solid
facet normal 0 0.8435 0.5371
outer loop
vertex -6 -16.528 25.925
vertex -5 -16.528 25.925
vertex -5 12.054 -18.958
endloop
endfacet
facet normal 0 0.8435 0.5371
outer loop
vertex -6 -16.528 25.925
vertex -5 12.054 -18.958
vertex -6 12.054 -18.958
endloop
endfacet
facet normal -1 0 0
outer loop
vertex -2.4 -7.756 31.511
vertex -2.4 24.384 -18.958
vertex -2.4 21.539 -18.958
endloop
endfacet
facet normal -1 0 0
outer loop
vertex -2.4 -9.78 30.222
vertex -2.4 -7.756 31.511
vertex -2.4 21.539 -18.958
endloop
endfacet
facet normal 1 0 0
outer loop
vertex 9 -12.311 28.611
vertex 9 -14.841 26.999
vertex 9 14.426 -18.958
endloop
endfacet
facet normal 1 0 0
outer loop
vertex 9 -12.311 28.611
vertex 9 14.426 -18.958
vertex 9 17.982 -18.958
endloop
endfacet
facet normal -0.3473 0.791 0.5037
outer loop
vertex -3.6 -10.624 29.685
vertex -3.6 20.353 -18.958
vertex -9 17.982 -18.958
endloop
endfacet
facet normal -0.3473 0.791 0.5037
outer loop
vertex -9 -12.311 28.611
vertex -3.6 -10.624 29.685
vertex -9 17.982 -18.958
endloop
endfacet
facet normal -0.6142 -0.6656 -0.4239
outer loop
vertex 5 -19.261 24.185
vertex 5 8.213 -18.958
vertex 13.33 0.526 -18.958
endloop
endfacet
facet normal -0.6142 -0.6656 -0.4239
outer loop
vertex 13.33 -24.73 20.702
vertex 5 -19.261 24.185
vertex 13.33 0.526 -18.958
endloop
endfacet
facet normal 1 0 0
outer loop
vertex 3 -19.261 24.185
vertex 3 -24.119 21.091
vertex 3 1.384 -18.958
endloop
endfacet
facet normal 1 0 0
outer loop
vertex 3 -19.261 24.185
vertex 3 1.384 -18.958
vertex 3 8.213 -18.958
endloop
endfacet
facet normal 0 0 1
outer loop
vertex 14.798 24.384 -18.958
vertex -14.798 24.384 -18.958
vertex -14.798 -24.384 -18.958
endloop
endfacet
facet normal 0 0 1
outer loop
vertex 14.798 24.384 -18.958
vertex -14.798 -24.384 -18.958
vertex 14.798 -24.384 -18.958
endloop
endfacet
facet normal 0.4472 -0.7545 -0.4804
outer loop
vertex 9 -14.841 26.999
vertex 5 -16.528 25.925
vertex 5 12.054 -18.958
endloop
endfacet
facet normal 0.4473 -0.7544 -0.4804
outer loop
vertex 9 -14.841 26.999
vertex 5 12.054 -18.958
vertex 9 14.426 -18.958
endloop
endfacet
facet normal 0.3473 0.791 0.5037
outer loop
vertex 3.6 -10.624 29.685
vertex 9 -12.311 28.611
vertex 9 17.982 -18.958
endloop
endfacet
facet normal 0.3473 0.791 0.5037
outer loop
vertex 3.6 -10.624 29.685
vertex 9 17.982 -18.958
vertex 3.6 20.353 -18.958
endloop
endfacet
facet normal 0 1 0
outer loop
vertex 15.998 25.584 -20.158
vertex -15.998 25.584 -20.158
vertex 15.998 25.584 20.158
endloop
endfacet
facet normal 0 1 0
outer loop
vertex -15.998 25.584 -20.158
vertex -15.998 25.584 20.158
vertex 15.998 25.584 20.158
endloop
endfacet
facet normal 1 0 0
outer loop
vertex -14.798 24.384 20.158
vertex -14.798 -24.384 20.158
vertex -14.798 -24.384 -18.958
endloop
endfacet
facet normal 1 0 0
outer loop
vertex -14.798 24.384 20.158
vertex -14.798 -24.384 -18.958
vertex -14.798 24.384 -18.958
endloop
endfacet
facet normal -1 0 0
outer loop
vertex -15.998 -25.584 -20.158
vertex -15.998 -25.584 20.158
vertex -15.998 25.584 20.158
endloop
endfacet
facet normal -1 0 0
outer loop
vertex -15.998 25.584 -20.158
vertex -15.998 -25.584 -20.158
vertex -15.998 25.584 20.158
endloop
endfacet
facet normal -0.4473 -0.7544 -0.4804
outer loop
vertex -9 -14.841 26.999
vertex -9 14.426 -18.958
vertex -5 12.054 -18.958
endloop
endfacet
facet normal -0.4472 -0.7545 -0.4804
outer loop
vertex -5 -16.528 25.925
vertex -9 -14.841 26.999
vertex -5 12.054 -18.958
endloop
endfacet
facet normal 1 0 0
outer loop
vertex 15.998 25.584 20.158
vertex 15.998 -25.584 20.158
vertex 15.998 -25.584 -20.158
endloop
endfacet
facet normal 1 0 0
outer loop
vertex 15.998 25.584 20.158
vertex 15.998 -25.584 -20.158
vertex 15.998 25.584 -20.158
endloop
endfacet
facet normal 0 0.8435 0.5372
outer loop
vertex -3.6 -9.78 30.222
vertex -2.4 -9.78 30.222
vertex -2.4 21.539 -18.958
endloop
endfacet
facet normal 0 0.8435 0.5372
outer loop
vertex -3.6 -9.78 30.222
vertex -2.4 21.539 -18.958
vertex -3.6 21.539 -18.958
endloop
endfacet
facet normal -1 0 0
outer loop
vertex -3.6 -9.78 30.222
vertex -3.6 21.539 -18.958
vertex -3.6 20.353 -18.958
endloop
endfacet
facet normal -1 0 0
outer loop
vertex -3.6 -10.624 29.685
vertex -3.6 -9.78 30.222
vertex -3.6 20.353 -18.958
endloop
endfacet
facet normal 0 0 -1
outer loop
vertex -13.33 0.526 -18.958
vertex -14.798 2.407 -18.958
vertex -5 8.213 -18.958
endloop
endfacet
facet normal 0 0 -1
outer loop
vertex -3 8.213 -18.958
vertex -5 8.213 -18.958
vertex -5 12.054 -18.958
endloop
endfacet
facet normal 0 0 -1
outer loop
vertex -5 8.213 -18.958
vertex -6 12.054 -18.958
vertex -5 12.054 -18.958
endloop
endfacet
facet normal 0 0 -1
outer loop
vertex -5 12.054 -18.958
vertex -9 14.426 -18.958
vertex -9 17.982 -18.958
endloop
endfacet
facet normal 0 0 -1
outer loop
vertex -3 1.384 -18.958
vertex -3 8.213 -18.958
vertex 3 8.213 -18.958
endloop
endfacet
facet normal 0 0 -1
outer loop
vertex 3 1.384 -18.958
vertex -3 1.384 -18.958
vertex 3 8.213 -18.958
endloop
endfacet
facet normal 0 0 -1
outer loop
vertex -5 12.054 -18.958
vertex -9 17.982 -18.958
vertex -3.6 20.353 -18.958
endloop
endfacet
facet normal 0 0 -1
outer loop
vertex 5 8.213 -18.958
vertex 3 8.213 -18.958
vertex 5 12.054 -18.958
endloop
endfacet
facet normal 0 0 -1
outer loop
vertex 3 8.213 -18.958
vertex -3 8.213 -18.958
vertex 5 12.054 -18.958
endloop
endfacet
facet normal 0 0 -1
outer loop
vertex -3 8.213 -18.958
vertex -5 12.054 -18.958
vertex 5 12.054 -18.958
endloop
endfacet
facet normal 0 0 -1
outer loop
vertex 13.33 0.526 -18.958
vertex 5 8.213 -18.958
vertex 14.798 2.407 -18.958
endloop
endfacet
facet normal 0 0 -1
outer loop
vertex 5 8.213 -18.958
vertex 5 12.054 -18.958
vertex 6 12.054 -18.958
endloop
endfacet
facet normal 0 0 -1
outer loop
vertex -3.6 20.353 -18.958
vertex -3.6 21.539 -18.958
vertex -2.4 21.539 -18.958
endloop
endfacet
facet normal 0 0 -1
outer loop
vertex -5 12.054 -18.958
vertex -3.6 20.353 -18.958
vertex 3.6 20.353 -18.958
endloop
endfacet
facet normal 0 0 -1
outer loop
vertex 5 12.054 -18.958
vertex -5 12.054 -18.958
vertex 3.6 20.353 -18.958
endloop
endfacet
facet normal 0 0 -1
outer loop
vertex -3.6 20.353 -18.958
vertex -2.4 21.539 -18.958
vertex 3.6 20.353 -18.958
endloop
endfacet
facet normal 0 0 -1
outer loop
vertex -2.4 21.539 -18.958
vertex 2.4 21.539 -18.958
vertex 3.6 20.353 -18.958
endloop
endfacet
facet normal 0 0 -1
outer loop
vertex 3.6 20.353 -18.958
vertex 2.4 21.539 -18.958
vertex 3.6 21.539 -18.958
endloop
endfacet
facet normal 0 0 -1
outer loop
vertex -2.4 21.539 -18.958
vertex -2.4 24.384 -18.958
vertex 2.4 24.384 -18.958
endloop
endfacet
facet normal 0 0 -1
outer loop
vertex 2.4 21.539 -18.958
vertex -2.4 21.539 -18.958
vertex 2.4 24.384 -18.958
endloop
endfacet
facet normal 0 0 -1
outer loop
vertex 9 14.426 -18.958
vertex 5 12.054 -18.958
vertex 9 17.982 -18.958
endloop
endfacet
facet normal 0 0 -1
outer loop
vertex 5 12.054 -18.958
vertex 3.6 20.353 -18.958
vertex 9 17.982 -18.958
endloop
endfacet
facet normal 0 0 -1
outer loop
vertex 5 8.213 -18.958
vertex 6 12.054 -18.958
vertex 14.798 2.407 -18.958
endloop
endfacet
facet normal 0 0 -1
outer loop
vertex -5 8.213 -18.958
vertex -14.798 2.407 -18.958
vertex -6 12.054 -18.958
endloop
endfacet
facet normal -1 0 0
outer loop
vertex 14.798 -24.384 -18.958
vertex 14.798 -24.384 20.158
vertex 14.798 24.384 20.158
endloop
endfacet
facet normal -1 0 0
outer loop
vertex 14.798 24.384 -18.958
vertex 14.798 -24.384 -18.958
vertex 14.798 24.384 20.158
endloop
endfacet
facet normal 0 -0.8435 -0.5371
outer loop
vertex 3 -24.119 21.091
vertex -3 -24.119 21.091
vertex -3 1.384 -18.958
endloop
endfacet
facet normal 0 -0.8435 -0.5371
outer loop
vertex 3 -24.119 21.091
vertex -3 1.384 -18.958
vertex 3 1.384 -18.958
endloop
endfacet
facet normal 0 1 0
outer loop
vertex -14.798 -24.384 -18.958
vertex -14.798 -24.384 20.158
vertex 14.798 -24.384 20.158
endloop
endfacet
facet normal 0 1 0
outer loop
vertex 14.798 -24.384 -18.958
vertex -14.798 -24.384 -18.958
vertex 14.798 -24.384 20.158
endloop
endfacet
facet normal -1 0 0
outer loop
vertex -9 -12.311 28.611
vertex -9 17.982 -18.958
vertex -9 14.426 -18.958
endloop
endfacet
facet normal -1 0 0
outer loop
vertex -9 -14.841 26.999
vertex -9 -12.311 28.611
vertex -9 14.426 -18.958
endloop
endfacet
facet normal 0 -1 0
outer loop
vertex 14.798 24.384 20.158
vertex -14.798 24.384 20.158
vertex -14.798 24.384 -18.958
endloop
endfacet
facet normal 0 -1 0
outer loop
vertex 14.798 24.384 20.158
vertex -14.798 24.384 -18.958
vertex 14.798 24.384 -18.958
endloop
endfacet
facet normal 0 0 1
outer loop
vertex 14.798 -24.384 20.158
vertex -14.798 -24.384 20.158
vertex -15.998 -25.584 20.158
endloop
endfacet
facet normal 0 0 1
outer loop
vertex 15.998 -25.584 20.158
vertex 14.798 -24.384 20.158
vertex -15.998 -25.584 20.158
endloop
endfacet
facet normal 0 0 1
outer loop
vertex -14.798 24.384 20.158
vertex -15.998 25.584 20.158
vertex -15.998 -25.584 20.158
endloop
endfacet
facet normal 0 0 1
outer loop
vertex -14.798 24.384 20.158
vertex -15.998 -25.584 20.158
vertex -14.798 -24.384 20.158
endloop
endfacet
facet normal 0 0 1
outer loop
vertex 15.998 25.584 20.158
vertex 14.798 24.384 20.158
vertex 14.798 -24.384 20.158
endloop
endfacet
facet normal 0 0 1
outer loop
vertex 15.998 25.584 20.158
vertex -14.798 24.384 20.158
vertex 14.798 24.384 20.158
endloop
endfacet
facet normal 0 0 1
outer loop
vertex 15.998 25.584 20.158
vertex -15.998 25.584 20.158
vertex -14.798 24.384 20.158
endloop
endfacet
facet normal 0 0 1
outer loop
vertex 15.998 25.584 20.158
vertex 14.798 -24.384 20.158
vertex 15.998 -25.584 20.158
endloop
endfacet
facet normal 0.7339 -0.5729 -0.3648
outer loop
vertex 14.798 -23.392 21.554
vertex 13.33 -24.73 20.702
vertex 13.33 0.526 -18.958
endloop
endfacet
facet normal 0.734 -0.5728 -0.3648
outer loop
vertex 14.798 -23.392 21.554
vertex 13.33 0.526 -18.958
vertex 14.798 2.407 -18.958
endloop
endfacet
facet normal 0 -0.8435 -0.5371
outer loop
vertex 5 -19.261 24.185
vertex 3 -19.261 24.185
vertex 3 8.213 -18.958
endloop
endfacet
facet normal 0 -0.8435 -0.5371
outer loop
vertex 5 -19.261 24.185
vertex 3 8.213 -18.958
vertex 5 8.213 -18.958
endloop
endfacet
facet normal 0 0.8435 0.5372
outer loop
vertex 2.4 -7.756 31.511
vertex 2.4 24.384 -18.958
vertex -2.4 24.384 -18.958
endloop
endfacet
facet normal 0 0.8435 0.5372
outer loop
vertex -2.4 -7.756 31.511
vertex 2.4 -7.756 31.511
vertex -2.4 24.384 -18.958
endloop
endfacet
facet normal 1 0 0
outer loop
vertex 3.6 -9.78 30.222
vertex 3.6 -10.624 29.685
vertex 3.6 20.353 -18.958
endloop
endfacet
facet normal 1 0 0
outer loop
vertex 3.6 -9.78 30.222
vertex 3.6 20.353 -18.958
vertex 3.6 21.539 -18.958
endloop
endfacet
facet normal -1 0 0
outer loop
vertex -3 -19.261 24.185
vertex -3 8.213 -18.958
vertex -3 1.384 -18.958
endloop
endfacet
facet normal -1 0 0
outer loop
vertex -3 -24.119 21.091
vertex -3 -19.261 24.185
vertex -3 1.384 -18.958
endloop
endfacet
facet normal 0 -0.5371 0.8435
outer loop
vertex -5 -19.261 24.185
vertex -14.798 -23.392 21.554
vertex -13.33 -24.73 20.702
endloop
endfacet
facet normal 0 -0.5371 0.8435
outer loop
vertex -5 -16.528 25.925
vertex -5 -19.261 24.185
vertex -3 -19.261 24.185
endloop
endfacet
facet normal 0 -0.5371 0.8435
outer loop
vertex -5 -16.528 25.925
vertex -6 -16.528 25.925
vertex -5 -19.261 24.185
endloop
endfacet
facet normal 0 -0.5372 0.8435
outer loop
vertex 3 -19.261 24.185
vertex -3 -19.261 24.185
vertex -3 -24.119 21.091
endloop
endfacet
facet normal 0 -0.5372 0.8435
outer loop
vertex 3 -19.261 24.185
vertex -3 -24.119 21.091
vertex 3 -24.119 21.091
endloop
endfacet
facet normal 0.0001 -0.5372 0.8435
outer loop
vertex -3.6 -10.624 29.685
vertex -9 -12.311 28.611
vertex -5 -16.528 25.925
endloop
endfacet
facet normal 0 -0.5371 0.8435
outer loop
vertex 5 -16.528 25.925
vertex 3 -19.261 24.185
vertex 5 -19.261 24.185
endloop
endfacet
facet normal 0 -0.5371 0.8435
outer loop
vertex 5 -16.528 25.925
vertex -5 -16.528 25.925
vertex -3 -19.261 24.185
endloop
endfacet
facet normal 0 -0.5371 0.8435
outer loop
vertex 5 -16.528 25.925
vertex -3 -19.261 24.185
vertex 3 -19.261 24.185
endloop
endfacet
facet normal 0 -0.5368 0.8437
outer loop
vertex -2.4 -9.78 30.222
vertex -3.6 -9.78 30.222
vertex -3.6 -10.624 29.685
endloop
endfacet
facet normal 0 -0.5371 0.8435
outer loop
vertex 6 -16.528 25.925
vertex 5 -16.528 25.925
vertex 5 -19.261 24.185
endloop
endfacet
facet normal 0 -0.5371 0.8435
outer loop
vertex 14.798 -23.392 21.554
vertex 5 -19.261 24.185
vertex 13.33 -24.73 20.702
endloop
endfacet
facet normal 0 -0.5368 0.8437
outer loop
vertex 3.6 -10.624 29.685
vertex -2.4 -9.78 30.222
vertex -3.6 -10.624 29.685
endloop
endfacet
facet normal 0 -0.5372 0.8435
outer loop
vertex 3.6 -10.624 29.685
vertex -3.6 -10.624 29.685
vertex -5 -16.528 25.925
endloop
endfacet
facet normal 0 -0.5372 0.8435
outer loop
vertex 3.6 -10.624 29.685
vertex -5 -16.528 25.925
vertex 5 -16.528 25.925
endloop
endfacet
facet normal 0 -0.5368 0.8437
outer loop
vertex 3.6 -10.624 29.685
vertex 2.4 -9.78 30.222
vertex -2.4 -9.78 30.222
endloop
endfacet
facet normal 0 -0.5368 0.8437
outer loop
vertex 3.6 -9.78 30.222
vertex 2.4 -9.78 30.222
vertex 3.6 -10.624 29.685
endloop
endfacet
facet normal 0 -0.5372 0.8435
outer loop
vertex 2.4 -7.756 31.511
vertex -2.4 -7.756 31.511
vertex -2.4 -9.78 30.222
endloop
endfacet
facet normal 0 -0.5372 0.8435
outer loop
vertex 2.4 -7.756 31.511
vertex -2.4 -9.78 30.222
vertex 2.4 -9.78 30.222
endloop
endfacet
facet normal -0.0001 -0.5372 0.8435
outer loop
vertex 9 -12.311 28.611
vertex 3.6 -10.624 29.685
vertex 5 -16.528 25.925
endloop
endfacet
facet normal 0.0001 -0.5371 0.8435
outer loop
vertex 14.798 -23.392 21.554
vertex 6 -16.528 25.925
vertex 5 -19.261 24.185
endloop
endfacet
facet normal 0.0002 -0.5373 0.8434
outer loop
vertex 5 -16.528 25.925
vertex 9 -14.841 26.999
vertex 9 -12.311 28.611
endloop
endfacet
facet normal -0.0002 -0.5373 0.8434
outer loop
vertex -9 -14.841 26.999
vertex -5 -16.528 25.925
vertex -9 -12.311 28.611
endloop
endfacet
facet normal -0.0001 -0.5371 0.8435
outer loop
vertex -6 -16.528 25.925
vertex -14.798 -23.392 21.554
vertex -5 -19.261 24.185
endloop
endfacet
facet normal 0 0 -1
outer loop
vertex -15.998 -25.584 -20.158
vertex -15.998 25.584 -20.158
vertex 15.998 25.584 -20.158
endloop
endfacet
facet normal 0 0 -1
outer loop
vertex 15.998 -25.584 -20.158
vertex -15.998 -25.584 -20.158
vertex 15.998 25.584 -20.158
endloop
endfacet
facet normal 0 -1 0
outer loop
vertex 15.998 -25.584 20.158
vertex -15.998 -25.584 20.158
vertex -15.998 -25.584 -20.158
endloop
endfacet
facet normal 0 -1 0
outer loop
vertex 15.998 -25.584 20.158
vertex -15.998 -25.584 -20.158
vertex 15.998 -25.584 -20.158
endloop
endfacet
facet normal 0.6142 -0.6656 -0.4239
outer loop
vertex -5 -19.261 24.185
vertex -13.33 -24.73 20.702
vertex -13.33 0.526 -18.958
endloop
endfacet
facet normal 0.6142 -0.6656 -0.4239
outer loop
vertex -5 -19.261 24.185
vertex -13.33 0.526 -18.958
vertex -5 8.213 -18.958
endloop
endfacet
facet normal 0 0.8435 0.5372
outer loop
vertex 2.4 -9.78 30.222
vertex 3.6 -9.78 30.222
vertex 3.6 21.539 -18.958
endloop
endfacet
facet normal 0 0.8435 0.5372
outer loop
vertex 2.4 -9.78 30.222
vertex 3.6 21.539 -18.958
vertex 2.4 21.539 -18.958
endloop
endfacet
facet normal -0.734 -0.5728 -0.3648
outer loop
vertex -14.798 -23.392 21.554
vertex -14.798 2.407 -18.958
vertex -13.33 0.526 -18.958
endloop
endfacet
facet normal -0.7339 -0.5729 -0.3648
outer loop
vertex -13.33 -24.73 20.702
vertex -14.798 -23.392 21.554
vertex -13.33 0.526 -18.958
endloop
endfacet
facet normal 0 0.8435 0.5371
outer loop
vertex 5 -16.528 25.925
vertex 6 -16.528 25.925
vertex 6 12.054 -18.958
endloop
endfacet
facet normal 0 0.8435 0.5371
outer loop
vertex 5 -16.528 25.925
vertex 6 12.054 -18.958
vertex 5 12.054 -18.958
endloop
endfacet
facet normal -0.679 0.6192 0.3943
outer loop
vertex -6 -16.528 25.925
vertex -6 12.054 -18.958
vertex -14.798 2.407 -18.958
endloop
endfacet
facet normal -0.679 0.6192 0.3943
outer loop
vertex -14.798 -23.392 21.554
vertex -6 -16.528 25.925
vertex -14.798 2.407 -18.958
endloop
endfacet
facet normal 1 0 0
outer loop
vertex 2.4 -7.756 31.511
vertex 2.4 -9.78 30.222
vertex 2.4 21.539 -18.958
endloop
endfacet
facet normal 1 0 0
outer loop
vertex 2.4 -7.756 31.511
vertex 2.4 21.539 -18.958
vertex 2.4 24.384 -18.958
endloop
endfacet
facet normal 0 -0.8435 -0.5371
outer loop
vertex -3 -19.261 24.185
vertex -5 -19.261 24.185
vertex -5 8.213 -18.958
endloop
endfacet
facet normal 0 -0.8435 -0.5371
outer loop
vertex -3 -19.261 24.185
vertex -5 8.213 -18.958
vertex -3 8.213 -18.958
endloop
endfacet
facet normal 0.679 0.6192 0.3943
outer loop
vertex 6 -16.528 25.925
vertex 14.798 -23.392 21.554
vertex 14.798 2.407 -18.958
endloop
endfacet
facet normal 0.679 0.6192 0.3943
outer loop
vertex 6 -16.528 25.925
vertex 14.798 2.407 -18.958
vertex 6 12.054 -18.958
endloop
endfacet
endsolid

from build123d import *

# Parameters (mm, degrees)
F0_W     = 31.995
F0_H     = 51.168
F1_DEPTH = 20.158
F3_T     = -1.2
F5_REACH = 97.2809453654


with BuildPart() as f1:
    # F0 (on Top) → F1 (new body, symmetric)
    with BuildSketch(Plane.XY):
        Rectangle(F0_W, F0_H)
    extrude(amount=F1_DEPTH, both=True)

    # F3
    f3_openings = [f1.faces().sort_by_distance(p)[0] for p in [
        (0, 0, 20.158),
    ]]
    offset(amount=F3_T, openings=f3_openings)


with BuildPart() as f5:
    f5_end = Plane.XY.offset(-18.958)
    # F4 (on face) → F5 (new body, up to a plane its end follows)
    with BuildSketch(Plane(origin=(0, -16.5150093929, 25.9333592132), x_dir=(1, 0, 0), z_dir=(0, -0.5371524006, 0.8434852094))):
        Polygon((3, -3.2555523465), (5, -3.2555523465), (13.3302325572, -9.7396252559), (14.7975749325, -8.1533091782), (6, -0.0155523465), (5, -0.0155523465), (9, 1.9844476535), (9, 4.9844476535), (3.6, 6.9844476535), (3.6, 7.9844476535), (2.4, 7.9844476535), (2.4, 10.3844476535), (0, 10.3844476535), (-2.4, 10.3844476535), (-2.4, 7.9844476535), (-3.6, 7.9844476535), (-3.6, 6.9844476535), (-9, 4.9844476535), (-9, 1.9844476535), (-5, -0.0155523465), (-6, -0.0155523465), (-14.7975749325, -8.1533091782), (-13.3302325572, -9.7396252559), (-5, -3.2555523465), (-3, -3.2555523465), (-3, -9.0155523465), (0, -9.0155523465), (3, -9.0155523465), align=None)
    f5_long = extrude(amount=-F5_REACH, mode=Mode.PRIVATE)
    add(split(f5_long, bisect_by=f5_end, keep=Keep.TOP, mode=Mode.PRIVATE))


solid = Compound([f1.part, f5.part])
